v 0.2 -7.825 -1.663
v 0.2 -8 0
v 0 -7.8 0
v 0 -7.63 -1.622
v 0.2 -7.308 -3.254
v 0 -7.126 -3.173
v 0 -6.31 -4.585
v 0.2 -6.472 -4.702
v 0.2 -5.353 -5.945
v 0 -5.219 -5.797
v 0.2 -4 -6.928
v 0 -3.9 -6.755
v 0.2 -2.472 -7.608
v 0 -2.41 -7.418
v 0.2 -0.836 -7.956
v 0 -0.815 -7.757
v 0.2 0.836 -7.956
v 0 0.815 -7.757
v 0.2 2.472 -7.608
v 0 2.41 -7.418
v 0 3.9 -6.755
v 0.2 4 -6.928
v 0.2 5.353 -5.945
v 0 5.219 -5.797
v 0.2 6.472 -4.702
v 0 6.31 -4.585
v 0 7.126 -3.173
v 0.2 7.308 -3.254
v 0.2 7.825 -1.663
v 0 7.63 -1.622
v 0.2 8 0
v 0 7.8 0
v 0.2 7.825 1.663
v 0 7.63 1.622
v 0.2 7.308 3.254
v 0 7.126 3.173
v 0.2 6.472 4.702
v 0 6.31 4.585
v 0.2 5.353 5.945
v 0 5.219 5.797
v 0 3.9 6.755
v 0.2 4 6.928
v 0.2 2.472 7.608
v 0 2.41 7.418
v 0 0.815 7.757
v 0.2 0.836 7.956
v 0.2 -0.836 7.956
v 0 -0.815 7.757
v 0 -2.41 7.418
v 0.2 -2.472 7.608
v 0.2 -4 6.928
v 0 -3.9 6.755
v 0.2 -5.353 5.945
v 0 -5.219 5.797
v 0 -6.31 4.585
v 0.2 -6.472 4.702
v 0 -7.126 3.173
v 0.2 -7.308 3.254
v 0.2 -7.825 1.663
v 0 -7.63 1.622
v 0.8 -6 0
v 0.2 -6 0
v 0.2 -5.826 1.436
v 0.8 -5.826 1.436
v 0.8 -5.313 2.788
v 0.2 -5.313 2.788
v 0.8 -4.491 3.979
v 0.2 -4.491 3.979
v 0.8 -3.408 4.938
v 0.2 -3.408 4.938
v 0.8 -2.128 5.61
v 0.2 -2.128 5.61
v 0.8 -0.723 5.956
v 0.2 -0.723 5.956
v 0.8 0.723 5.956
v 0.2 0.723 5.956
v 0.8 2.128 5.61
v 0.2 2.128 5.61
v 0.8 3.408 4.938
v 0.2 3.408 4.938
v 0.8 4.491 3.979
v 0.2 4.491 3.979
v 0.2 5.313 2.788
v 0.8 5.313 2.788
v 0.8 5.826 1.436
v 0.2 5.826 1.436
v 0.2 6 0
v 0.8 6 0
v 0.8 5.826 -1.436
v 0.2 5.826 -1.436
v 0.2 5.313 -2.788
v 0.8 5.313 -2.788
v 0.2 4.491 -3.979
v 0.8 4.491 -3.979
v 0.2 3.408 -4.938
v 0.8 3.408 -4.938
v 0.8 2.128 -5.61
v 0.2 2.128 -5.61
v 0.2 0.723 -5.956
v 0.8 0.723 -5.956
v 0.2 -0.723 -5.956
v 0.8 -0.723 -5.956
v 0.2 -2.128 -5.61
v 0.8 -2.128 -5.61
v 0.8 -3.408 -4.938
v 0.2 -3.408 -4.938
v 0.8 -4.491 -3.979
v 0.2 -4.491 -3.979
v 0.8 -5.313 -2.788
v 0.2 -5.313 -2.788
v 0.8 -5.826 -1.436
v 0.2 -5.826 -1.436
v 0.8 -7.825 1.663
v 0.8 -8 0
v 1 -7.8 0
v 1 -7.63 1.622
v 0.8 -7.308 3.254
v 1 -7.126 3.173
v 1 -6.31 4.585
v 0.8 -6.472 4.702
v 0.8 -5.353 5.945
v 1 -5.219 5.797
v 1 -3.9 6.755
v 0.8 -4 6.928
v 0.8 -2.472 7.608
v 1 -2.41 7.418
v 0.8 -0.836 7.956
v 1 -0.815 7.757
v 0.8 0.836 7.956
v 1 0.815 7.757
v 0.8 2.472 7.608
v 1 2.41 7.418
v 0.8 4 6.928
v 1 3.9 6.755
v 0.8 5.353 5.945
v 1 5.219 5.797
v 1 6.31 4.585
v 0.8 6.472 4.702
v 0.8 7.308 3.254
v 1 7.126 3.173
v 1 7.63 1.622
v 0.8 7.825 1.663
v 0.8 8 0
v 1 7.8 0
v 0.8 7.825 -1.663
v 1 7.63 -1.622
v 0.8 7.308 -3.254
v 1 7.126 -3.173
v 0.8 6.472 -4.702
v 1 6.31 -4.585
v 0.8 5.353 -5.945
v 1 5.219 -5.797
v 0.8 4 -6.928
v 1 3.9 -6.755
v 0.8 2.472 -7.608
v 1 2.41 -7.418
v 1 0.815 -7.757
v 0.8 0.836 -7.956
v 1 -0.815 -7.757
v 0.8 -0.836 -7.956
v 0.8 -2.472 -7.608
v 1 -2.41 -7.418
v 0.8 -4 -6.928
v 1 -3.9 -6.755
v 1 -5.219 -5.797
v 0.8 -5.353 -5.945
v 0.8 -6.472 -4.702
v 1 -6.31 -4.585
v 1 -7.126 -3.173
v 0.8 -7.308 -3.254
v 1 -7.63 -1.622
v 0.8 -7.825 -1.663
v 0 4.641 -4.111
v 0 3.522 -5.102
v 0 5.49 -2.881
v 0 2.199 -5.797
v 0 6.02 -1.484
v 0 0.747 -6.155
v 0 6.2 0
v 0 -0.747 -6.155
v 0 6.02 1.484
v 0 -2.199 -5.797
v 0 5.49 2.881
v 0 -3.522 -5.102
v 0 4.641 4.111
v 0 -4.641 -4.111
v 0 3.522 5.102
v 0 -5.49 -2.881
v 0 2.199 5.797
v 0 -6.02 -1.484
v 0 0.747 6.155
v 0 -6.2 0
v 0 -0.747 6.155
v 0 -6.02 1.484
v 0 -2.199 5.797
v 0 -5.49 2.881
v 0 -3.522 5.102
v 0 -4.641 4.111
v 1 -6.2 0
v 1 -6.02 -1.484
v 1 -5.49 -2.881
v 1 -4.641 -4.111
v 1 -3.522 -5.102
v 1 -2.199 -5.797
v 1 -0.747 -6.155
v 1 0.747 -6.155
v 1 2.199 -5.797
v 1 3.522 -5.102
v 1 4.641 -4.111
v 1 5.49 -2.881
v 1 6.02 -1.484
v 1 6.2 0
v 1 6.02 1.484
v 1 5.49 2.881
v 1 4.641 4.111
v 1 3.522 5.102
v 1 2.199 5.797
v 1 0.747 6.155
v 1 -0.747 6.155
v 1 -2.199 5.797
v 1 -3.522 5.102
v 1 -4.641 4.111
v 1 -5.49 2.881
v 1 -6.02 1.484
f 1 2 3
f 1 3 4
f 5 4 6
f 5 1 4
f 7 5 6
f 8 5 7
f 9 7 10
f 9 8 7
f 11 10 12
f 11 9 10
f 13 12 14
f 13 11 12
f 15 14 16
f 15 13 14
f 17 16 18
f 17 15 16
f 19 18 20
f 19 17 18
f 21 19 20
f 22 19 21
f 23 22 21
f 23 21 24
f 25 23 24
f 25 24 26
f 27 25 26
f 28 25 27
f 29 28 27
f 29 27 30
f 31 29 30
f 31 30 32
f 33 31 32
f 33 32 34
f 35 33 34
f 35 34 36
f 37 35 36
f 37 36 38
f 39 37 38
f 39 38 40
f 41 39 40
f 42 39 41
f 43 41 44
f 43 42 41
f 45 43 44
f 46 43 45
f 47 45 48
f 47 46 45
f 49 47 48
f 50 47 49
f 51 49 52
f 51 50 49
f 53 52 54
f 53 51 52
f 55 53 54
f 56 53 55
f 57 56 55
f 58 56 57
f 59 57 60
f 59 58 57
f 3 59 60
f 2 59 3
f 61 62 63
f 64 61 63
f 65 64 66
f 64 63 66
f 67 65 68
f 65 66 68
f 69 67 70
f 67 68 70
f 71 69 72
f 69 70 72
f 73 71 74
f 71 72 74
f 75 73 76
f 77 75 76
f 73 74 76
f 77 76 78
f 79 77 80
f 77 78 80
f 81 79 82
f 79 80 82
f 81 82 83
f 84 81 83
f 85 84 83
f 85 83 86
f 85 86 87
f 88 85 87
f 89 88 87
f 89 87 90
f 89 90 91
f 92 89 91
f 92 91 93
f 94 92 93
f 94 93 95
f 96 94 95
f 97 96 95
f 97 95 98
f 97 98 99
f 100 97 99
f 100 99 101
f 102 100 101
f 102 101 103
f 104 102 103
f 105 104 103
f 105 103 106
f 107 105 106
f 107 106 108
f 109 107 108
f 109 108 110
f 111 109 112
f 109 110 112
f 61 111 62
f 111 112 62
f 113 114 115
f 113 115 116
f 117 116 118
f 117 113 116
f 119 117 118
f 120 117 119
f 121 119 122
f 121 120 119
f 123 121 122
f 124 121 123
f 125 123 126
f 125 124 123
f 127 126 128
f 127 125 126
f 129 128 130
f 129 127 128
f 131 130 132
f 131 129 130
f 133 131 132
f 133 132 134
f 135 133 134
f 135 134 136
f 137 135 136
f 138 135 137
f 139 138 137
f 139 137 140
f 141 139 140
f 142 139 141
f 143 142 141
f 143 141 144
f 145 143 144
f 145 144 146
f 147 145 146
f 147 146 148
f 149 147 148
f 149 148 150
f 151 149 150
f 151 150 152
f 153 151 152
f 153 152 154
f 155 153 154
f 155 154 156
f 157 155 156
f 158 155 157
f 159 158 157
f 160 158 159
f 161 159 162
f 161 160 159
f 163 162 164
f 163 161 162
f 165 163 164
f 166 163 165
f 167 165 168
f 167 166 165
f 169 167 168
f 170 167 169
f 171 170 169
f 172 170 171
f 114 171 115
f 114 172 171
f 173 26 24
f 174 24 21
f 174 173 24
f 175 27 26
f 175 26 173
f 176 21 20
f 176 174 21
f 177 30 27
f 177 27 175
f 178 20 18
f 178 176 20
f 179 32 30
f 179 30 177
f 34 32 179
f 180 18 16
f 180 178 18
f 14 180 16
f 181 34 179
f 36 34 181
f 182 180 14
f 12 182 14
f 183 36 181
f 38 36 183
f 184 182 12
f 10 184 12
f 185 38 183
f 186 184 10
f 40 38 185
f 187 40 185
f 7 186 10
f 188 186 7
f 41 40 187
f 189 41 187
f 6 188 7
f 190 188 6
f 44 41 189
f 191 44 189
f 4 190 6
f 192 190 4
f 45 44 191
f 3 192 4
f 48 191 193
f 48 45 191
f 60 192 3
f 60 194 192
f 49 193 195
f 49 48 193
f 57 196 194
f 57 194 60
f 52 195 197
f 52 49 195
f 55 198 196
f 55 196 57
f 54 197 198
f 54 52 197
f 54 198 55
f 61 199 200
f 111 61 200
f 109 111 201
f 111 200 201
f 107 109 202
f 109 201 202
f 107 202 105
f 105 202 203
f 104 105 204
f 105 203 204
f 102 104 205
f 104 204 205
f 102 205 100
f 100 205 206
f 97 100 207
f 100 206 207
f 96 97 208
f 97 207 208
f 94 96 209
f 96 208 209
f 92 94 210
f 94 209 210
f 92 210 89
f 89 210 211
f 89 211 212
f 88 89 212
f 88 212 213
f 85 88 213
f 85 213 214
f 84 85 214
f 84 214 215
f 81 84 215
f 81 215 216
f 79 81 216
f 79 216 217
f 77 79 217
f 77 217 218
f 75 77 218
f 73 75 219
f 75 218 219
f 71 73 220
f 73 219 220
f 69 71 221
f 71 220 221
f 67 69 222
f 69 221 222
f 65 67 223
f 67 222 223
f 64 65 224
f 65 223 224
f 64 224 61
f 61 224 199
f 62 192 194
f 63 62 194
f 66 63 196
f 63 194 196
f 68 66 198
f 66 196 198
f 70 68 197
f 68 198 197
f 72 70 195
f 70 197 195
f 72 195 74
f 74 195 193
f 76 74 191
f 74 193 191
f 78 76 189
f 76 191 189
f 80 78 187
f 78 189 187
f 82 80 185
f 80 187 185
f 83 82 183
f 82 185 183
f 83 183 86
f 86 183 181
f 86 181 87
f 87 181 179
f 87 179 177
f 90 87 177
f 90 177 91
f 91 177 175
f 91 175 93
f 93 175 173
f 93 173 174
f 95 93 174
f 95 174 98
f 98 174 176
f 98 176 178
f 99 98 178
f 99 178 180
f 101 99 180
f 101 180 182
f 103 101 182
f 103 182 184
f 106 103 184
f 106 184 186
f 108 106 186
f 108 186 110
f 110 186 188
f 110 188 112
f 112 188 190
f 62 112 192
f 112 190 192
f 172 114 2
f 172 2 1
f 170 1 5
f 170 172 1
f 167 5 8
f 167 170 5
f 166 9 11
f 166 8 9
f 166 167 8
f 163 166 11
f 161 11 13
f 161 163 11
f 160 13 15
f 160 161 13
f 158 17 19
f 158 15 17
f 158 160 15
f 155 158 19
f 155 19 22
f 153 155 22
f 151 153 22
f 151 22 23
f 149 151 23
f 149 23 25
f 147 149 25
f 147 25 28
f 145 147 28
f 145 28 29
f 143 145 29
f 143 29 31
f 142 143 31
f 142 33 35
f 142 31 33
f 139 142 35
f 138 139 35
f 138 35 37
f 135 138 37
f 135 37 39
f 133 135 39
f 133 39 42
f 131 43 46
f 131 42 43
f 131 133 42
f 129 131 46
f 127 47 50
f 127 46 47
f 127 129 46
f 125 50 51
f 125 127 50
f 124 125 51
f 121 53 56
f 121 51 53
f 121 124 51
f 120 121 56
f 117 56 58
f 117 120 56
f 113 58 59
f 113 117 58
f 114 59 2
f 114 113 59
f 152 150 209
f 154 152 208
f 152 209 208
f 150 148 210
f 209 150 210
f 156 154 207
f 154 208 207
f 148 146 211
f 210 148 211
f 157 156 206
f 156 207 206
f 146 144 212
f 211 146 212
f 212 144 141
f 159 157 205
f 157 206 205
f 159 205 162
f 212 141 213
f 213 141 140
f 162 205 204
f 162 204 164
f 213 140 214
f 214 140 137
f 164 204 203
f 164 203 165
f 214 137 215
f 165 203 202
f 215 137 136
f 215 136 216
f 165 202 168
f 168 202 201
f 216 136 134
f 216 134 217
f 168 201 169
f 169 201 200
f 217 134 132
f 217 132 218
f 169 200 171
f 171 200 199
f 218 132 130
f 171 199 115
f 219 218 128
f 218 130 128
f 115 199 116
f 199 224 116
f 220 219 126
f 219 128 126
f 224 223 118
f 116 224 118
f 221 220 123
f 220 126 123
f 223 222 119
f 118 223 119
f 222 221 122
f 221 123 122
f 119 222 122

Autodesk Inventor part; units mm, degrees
sketch "Sketch_1" plane through (0, 0, 0) normal (0, 0, 1) x (1, 0, 0)
  line L0 (-3, 0) -> (3, 0)
  line L1 (0, -6.2) -> (0, -7.8)
  line L2 (0, -7.8) -> (0.2, -8)
  line L3 (0.2, -8) -> (0.8, -8)
  line L4 (0.8, -8) -> (1, -7.8)
  line L5 (1, -7.8) -> (1, -6.2)
  line L6 (1, -6.2) -> (0.8, -6)
  line L7 (0.8, -6) -> (0.2, -6)
  line L8 (0.2, -6) -> (0, -6.2)
revolve "Revolution1" add sketch "Sketch_1" angle 360 about axis through (-3, 0, 0) along (-1, 0, 0)
ref_plane "a_XY" through (0, 0, 0) normal (1, 0, 0) x (0, 0, -1)
ref_plane "a_YZ" through (0, 0, 0) normal (0, 0, -1) x (0, 1, 0)
ref_plane "a_ZX" through (0, 0, 0) normal (0, 1, 0) x (1, 0, 0)
properties part number "WSSS16-12-1"
